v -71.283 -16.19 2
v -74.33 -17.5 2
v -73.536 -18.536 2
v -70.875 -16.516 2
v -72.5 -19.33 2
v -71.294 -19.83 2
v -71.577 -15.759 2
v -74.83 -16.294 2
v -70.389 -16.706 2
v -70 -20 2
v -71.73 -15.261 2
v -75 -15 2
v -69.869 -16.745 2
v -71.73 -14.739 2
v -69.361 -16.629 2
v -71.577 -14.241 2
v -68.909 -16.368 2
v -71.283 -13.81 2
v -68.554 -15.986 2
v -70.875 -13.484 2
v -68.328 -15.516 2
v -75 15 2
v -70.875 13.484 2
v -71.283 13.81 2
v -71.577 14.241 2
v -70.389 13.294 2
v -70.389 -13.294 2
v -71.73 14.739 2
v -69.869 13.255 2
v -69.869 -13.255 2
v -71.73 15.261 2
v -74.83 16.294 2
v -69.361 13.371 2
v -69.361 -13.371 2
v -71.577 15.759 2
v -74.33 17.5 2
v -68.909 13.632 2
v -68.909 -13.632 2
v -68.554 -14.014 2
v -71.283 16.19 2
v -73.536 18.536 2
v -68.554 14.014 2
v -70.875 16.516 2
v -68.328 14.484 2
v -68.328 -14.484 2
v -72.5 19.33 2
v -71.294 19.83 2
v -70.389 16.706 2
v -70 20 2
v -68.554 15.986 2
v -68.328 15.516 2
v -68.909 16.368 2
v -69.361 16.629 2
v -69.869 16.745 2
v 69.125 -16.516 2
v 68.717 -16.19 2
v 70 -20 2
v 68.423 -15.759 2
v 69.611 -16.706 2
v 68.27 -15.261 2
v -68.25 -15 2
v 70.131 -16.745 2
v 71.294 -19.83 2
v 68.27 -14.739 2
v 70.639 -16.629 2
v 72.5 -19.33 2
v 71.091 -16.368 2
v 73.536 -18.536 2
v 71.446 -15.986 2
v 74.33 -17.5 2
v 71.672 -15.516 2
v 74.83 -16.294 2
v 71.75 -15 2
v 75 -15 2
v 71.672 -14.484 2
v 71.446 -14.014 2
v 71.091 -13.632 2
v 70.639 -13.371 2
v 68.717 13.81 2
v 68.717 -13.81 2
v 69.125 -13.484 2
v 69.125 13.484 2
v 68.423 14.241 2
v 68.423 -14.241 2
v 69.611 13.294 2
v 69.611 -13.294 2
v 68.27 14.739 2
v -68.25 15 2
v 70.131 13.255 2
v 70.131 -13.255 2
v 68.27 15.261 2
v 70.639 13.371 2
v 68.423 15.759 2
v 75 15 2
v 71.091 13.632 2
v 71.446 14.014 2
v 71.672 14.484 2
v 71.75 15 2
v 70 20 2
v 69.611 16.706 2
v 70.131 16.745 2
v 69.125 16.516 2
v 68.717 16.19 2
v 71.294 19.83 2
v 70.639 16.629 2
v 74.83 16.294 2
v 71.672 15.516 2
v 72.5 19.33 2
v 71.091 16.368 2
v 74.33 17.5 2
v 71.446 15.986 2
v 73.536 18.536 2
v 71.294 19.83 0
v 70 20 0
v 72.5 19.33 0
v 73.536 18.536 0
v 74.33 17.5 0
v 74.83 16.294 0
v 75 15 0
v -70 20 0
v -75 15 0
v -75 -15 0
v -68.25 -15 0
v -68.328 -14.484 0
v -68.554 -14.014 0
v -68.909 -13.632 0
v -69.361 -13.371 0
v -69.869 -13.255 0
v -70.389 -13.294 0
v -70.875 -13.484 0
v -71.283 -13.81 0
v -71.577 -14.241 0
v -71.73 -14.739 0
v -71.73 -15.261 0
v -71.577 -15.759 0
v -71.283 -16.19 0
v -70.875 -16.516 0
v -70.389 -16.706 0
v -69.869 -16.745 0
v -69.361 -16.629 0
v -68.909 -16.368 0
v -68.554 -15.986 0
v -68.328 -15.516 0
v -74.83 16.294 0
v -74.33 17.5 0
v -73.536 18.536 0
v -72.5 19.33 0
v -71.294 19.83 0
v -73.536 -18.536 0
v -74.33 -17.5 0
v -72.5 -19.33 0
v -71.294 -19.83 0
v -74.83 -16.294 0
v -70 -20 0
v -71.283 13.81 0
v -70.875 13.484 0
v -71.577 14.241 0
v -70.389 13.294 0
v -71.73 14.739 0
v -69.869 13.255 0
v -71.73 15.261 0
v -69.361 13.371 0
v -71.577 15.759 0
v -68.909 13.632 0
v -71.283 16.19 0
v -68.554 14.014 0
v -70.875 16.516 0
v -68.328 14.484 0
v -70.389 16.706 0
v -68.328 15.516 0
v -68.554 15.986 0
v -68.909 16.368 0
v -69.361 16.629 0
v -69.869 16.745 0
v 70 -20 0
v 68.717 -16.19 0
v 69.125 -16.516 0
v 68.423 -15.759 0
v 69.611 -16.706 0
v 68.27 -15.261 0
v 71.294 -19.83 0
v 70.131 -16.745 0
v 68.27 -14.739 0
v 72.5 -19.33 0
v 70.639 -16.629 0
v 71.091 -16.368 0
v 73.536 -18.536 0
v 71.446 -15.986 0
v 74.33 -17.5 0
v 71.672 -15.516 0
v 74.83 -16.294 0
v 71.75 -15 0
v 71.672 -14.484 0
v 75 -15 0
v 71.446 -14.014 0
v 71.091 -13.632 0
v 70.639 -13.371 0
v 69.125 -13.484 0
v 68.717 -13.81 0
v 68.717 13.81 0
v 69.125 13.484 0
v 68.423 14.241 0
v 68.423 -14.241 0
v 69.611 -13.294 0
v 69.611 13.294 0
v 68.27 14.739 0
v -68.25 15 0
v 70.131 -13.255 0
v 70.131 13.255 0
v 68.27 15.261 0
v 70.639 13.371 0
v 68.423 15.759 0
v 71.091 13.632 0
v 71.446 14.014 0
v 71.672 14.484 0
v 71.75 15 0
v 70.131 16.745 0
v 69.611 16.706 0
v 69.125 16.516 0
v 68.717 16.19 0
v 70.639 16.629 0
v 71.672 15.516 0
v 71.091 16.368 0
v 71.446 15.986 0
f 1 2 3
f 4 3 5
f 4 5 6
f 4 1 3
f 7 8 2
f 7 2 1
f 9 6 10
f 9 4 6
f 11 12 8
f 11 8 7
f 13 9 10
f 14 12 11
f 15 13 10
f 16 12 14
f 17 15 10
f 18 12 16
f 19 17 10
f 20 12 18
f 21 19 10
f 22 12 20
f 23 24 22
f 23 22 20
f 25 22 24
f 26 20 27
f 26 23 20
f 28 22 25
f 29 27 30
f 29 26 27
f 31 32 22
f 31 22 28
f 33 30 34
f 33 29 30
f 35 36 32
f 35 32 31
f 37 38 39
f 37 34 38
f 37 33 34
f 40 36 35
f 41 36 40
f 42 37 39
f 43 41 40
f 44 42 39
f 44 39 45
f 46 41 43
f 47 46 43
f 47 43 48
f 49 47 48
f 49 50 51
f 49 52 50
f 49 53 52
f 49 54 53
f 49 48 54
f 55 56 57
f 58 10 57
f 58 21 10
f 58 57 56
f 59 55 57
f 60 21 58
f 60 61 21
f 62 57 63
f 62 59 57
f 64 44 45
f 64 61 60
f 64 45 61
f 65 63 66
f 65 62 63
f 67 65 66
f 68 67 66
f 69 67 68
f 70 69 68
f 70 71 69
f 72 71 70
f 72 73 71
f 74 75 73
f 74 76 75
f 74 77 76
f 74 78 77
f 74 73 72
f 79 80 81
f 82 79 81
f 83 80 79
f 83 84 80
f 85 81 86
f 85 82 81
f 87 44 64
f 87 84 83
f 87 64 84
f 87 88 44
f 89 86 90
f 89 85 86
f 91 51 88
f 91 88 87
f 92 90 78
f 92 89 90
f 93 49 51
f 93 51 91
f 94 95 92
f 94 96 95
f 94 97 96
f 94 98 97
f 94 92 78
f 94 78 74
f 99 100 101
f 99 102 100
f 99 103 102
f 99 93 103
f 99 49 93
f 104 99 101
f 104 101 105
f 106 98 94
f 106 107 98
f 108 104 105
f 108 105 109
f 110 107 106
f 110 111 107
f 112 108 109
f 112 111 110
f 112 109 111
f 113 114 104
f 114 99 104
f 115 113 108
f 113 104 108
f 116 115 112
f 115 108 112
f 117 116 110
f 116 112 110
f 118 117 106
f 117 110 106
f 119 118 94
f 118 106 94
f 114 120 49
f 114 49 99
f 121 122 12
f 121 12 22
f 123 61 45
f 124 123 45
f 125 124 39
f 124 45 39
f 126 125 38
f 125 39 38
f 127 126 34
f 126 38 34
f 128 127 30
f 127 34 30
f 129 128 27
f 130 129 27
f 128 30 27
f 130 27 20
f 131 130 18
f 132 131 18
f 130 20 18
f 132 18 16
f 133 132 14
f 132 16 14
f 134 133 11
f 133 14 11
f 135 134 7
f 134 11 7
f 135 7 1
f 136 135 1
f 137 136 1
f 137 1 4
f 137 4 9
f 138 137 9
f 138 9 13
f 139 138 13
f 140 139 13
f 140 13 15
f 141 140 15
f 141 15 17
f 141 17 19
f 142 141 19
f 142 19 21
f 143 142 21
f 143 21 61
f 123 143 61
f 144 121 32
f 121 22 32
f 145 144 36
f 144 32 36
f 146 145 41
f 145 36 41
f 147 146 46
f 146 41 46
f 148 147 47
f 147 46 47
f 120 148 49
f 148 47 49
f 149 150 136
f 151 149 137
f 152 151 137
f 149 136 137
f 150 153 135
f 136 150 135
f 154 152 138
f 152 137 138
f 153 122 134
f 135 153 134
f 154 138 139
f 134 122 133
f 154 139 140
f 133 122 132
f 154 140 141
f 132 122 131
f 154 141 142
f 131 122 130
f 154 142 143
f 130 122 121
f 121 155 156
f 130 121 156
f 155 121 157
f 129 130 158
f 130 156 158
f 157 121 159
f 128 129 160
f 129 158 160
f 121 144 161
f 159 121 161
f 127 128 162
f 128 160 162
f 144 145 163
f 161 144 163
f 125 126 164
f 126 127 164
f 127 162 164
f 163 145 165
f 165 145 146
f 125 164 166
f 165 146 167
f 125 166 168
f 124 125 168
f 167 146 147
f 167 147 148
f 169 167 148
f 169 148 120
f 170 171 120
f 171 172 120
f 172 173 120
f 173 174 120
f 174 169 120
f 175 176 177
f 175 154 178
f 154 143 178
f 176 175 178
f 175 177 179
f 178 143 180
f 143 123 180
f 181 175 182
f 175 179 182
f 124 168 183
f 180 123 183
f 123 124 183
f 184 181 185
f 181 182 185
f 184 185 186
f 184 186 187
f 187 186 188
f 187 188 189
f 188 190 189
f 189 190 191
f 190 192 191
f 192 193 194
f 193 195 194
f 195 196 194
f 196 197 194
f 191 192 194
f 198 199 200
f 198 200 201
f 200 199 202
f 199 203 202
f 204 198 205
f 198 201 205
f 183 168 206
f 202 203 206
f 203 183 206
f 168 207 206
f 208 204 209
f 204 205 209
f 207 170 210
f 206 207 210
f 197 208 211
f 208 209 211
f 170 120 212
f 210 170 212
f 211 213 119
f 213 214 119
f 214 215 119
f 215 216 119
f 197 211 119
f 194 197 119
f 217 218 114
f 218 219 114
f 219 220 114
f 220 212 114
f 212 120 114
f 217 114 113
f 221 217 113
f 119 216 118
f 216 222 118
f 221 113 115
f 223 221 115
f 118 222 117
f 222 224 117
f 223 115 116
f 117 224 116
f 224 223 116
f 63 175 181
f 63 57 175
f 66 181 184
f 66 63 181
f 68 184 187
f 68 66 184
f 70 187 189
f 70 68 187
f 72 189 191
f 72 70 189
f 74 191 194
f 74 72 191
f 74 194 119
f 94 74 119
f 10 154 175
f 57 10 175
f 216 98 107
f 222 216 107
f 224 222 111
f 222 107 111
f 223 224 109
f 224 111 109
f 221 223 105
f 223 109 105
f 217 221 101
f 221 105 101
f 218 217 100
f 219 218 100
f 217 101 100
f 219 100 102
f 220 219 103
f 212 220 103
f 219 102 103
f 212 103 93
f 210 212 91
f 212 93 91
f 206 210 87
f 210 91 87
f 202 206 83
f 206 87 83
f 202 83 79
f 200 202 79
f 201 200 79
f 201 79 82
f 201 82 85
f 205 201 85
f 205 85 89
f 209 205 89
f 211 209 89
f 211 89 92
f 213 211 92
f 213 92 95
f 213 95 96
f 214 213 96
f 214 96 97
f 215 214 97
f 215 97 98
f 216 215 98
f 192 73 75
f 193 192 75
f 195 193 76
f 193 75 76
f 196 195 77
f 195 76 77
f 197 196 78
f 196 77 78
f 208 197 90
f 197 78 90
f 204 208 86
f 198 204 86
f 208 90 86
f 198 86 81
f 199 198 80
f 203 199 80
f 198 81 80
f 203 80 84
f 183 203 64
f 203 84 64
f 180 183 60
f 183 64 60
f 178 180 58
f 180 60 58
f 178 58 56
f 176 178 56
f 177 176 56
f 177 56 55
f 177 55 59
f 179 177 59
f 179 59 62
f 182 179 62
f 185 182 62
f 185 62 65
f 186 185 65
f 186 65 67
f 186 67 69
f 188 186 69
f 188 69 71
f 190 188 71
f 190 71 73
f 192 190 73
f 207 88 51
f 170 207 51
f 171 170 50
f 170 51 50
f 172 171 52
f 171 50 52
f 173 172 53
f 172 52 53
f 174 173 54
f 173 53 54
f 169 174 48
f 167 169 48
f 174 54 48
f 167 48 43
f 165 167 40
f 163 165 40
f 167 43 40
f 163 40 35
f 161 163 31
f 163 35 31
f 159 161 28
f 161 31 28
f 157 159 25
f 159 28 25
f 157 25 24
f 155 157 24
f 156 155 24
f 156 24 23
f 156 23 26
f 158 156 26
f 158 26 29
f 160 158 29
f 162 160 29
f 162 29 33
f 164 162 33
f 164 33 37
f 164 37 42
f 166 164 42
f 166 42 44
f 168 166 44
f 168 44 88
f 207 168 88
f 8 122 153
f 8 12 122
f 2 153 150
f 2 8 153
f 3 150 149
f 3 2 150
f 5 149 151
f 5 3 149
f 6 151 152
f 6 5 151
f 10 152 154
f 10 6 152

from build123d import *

# Parameters (mm, degrees)
SKETCH1_W           = 150
SKETCH1_H           = 40
BOSS_EXTRUDE1_DEPTH = 2
SKETCH2_R           = 1.75
CUT_EXTRUDE1_DEPTH  = 3
FILLET1_R           = 5


with BuildPart() as part:
    # Sketch1 → Boss-Extrude1 (new body)
    with BuildSketch(Plane.XY):
        Rectangle(SKETCH1_W, SKETCH1_H)
    extrude(amount=BOSS_EXTRUDE1_DEPTH)

    # Sketch2 → Cut-Extrude1 (cut, through all)
    with BuildSketch(Plane.XY.offset(2)):
        with Locations((-70, 15)):
            Circle(SKETCH2_R)
        with Locations((-70, -15)):
            Circle(SKETCH2_R)
        with Locations((70, -15)):
            Circle(SKETCH2_R)
        with Locations((70, 15)):
            Circle(SKETCH2_R)
    extrude(amount=-CUT_EXTRUDE1_DEPTH, mode=Mode.SUBTRACT)

    # Fillet1
    fillet1_edges = [part.edges().sort_by_distance(p)[0] for p in [
        (-75, 20, 1),
        (75, 20, 1),
        (75, -20, 1),
        (-75, -20, 1),
    ]]
    fillet(fillet1_edges, radius=FILLET1_R)


solid = part.part
